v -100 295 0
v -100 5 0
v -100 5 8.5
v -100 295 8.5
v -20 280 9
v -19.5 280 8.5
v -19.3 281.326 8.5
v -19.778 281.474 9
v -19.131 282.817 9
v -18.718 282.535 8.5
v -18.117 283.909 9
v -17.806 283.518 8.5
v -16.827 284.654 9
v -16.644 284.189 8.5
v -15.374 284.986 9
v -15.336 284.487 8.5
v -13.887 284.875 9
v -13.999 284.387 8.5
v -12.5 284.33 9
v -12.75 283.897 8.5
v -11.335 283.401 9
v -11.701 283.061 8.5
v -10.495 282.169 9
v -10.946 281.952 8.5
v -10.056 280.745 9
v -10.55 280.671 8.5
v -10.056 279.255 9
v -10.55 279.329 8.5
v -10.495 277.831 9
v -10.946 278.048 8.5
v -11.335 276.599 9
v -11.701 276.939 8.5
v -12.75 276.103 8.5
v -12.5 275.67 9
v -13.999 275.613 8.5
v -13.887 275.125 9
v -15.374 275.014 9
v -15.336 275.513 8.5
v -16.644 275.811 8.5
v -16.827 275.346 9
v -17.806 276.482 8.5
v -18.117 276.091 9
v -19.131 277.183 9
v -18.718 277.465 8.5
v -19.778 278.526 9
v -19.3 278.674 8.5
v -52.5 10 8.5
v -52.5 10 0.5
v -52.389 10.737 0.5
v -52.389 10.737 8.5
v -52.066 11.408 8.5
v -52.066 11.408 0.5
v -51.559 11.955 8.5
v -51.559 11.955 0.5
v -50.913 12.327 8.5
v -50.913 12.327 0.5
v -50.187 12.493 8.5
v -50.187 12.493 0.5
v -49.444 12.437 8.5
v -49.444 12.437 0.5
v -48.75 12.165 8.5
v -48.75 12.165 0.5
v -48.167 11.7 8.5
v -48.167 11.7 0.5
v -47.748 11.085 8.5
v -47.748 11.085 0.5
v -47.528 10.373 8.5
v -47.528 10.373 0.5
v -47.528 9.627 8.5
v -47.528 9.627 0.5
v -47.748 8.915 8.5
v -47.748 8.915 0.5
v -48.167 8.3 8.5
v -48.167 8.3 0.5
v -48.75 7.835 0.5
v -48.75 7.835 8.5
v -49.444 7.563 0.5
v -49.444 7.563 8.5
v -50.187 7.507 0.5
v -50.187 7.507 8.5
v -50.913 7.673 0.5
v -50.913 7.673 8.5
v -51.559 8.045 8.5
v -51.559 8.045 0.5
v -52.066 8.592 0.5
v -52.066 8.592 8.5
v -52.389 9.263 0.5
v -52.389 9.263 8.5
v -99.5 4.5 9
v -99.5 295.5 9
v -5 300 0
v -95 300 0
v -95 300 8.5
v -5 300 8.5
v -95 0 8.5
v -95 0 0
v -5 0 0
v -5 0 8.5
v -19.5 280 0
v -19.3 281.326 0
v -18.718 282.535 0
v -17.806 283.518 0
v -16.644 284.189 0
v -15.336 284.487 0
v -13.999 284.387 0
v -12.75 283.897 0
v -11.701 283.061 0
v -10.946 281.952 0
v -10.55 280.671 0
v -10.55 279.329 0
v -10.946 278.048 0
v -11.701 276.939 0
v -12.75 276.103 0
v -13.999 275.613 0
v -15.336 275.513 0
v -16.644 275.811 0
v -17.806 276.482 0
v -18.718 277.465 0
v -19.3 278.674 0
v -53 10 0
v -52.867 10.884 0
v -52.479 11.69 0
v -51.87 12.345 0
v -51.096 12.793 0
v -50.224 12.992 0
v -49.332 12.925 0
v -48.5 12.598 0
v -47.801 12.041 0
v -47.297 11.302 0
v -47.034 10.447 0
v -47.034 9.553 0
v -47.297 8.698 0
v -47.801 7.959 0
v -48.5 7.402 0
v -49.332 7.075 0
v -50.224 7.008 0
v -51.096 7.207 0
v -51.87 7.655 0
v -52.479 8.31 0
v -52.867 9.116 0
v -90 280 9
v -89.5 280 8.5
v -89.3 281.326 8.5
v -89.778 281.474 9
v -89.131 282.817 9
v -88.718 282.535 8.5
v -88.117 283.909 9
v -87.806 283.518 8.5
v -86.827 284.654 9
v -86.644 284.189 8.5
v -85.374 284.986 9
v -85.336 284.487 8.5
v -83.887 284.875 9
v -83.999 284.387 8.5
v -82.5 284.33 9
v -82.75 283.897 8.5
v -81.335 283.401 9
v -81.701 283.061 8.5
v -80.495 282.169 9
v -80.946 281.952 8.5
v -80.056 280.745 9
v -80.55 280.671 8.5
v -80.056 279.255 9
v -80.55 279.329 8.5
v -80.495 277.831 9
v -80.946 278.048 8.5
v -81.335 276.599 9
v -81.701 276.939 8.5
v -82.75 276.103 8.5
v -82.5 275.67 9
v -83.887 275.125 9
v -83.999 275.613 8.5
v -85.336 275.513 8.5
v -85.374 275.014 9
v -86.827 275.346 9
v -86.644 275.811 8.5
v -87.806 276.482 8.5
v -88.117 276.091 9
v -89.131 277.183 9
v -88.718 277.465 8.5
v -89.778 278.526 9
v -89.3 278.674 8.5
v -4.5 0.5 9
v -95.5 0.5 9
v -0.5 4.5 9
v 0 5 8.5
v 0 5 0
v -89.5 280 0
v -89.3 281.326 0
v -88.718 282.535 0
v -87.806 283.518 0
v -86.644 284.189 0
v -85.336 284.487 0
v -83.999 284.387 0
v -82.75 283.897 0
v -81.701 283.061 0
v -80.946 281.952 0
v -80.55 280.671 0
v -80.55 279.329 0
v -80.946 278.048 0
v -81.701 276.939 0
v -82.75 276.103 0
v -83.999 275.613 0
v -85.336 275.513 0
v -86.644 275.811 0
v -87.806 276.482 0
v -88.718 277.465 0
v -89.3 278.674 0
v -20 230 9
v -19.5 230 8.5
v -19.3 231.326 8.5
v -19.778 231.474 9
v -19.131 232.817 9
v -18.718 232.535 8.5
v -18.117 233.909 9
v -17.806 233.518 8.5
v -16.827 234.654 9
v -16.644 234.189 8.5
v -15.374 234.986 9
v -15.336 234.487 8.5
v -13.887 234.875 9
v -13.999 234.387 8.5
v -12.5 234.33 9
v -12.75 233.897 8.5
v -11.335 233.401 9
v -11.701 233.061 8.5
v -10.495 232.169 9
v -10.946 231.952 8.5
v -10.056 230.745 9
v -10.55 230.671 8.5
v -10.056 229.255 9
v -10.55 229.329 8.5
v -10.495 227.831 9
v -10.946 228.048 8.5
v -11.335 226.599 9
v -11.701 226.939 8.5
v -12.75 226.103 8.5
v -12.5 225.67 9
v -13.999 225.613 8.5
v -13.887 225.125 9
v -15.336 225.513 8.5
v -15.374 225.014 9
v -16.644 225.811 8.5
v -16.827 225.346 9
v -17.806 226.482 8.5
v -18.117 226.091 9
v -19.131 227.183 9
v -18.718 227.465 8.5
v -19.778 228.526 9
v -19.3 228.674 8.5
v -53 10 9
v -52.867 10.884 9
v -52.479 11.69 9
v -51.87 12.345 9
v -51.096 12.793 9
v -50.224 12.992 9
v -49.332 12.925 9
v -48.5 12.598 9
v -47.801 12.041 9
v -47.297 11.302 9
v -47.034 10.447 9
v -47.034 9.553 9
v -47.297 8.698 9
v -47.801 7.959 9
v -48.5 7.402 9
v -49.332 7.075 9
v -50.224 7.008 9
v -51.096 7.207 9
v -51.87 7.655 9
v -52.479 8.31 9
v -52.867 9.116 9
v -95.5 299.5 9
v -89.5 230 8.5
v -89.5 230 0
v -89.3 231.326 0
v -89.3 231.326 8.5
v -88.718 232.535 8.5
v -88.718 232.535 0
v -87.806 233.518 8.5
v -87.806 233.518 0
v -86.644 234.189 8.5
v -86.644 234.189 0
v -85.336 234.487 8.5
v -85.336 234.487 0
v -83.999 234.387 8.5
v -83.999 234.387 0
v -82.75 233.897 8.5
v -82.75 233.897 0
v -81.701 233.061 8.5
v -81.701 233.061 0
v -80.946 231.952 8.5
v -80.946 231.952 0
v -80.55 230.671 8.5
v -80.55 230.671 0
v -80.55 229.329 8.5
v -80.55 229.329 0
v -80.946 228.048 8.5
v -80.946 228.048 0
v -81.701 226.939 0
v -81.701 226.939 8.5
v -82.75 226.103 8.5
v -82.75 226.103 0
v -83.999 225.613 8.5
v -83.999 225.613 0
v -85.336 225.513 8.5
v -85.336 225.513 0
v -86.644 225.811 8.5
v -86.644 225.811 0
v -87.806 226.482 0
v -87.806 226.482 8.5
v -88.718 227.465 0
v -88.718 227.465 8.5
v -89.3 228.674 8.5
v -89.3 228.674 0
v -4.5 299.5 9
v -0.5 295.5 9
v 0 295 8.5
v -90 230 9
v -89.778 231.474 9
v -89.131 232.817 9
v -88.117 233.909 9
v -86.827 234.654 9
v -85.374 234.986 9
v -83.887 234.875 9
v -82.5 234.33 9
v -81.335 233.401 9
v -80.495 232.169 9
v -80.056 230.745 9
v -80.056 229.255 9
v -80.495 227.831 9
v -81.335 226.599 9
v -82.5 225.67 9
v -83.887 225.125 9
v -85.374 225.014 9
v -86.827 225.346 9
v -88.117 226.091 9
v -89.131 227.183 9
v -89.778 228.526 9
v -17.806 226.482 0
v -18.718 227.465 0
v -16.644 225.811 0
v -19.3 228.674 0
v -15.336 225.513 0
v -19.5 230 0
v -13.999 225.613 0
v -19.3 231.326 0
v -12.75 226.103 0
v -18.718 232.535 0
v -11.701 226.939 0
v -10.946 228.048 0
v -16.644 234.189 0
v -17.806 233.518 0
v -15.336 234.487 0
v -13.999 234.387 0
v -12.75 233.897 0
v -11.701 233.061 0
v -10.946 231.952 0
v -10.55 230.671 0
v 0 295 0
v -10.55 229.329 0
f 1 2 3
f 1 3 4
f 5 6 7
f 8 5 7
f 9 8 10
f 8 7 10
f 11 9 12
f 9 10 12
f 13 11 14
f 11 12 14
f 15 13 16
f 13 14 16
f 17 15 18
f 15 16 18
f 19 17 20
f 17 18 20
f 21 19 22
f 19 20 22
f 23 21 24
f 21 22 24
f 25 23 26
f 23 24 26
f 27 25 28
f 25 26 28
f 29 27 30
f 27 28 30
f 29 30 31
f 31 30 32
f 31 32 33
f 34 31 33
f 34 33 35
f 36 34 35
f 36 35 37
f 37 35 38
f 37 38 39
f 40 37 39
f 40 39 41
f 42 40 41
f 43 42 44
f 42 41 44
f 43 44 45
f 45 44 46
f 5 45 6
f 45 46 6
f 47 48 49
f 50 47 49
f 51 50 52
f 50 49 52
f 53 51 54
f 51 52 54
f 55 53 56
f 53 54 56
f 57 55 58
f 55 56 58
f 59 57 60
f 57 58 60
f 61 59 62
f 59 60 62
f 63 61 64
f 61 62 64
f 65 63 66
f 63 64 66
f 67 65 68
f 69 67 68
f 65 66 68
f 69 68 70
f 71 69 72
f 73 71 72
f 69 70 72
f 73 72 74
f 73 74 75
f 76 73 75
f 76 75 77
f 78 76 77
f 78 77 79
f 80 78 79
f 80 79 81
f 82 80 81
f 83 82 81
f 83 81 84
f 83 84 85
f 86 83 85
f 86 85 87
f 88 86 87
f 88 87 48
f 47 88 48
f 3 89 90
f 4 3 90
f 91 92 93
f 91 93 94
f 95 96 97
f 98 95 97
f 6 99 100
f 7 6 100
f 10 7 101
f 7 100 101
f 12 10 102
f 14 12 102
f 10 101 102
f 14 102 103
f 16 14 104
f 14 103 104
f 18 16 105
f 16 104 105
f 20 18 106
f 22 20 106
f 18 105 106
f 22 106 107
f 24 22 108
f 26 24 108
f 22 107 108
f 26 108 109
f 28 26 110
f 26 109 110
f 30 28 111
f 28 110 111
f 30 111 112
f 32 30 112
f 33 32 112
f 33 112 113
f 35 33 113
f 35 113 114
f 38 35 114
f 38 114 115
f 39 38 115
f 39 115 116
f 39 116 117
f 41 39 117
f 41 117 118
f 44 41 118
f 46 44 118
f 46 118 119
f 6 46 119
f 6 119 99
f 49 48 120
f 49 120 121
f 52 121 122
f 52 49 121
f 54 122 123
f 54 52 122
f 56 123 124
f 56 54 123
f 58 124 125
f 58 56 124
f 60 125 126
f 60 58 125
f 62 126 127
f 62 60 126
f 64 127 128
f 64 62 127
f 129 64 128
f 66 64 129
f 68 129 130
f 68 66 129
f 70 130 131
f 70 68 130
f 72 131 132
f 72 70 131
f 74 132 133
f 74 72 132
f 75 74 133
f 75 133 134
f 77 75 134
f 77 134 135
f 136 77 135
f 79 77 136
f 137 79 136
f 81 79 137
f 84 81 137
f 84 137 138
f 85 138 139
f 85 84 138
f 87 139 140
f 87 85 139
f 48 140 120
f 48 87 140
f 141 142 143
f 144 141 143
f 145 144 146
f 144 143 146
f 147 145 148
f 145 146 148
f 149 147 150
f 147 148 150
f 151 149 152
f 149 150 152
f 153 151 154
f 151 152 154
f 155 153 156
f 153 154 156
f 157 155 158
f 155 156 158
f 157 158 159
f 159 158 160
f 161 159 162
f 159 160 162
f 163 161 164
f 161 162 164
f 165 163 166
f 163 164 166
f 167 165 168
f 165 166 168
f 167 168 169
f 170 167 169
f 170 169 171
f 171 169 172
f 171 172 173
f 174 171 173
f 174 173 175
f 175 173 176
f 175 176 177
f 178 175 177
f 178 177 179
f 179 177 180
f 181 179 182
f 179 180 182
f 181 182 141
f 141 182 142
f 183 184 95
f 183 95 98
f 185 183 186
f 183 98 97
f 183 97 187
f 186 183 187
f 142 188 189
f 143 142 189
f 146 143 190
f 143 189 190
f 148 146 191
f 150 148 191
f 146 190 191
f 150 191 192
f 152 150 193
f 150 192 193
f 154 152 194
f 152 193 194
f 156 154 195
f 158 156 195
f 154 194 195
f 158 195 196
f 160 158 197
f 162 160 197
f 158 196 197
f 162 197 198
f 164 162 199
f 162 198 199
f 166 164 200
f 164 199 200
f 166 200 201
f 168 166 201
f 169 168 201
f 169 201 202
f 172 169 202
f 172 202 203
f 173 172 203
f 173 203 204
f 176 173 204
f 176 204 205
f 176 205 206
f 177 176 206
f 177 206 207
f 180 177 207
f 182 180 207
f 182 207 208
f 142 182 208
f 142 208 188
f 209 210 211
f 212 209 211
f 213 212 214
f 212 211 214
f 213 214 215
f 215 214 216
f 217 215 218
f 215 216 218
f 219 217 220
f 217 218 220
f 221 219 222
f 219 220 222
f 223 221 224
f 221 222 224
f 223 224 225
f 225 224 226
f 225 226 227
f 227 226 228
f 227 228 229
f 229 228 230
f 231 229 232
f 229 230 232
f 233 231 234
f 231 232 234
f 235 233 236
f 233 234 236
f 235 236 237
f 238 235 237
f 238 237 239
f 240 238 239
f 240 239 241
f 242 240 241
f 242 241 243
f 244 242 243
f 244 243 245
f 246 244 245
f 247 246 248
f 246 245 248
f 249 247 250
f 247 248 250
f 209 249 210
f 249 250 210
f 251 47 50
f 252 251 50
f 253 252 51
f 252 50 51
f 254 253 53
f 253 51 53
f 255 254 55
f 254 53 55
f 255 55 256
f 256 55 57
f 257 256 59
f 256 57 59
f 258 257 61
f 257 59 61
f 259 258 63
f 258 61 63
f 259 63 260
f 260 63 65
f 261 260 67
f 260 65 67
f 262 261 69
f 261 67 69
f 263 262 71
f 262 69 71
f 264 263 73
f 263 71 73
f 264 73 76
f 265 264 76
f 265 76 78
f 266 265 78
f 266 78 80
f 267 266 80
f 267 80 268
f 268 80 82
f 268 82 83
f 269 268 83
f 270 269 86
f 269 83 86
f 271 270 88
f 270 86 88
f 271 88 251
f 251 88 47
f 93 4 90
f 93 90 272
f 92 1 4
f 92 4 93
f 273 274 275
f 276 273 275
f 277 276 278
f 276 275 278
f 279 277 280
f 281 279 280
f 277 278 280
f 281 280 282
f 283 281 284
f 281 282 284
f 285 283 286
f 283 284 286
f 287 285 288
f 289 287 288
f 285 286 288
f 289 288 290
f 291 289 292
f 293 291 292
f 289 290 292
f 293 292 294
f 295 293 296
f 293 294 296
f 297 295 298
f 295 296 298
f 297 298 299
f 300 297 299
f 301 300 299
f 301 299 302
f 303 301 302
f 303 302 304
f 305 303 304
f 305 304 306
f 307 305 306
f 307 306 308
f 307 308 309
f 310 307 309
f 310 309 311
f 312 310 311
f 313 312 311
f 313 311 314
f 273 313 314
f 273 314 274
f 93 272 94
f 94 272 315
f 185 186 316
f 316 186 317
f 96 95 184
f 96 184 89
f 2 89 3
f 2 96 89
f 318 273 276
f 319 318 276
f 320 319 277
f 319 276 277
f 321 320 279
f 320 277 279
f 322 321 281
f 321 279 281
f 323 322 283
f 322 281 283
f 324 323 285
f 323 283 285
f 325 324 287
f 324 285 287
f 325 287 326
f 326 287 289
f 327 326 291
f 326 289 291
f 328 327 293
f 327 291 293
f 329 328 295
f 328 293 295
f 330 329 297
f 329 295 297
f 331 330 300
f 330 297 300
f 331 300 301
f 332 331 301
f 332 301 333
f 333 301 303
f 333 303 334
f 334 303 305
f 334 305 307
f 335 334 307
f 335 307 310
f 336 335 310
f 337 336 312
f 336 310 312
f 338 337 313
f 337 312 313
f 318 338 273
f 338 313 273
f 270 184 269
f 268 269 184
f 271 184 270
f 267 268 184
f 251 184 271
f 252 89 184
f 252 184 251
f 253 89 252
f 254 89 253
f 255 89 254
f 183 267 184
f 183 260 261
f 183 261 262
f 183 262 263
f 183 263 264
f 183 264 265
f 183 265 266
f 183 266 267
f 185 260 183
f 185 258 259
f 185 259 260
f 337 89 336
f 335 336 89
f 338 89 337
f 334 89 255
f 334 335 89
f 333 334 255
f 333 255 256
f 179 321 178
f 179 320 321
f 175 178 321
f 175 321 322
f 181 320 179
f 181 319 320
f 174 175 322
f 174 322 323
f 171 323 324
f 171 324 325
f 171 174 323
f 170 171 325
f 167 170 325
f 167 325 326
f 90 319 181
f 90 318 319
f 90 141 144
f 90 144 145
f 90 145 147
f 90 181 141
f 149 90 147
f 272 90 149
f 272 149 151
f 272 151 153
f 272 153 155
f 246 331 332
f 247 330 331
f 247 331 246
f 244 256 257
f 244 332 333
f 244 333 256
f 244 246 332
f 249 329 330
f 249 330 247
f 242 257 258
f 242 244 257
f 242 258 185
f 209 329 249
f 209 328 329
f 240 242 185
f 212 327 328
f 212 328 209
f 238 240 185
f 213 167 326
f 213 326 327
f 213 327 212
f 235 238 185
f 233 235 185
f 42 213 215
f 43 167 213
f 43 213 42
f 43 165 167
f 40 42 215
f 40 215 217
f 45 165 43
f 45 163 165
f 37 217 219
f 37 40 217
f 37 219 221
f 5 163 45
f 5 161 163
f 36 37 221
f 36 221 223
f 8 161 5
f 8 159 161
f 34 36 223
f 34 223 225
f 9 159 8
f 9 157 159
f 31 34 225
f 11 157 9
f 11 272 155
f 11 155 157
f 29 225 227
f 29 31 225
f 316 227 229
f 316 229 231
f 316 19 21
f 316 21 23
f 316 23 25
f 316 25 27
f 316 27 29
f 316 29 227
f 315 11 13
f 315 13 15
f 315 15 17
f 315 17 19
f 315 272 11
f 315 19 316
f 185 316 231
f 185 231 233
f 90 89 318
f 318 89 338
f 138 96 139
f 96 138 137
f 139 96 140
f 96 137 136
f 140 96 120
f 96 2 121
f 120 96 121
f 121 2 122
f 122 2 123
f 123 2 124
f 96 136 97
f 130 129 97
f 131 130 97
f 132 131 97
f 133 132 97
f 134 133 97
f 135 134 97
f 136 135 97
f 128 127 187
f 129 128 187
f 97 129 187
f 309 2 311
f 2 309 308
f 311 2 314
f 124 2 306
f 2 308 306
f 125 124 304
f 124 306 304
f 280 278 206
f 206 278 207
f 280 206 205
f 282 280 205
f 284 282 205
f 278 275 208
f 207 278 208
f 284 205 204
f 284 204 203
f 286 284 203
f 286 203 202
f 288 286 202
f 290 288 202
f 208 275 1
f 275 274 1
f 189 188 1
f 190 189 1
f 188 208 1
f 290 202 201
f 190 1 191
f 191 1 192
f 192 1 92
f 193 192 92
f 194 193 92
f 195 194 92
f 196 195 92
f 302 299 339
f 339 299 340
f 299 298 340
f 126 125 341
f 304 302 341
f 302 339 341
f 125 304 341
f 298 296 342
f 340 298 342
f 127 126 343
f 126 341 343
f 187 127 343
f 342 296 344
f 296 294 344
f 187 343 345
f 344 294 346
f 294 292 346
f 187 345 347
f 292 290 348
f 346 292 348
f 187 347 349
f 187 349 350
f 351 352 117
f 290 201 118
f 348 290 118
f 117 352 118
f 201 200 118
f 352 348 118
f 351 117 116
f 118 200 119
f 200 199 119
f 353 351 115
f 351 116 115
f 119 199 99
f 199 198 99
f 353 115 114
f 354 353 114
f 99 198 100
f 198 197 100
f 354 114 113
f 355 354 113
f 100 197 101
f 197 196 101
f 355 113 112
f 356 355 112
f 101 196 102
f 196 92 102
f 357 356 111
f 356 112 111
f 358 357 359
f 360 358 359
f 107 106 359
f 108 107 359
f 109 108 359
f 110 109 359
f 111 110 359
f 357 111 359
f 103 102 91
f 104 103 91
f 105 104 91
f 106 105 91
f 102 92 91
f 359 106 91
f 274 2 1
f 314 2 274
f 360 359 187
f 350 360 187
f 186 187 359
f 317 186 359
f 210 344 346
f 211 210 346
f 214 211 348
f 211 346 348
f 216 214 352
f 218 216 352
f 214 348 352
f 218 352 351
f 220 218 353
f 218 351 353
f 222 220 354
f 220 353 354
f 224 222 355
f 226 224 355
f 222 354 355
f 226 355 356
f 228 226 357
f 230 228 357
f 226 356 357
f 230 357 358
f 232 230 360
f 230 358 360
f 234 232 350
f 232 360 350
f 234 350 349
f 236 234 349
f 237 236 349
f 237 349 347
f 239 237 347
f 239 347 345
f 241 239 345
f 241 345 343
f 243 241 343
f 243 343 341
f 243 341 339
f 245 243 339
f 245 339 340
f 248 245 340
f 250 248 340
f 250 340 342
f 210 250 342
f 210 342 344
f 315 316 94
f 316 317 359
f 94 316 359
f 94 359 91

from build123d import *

# Parameters (mm, degrees)
F0_W        = 100
F0_H        = 300
F1_DEPTH    = 9
F3_D        = 9
F5_D        = 5
F6_SIZE     = 0.5
F7_T1_DEPTH = 34.2168298797


# Not quite as in the source:
# - a fillet or chamfer that OpenCascade refuses, or shapes differently, is made with other operations: its cross-section is extruded or revolved along the edge and cut away or added


with BuildPart() as f1:
    # F0 (on Top) → F1 (new body)
    with BuildSketch(Plane.XY):
        with Locations((-50, 150)):
            Rectangle(F0_W, F0_H)
    extrude(amount=F1_DEPTH)

    # F3 (through all)
    with Locations(Plane.XY.offset(9)):
        with Locations((-85, 280), (-15, 280), (-15, 230), (-85, 230)):
            Hole(F3_D / 2)

    # F5 (through all)
    with Locations(Plane.XY.offset(9)):
        with Locations((-50, 10)):
            Hole(F5_D / 2)

    # F6
    f6_edges = [f1.edges().sort_by_distance(p)[0] for p in [
        (-50, 0, 9),
        (-100, 150, 9),
        (0, 150, 9),
        (-50, 300, 9),
        (-52.5, 10, 9),
        (-89.5, 230, 9),
        (-89.5, 280, 9),
        (-19.5, 230, 9),
        (-19.5, 280, 9),
        (-52.5, 10, 0),
    ]]
    chamfer(f6_edges, length=F6_SIZE)

    # F7: chamfer of 5 on 4 edges, made by hand

    # F7_s2 → F7_t1 (cut)
    with BuildSketch(Plane.XY.offset(-12.8584149398)):
        Polygon((-95, 0), (-100, 5), (-100, 0), align=None)
        Polygon((-5, 0), (0, 5), (0, 0), align=None)
        Polygon((-100, 295), (-95, 300), (-100, 300), align=None)
        Polygon((0, 295), (-5, 300), (0, 300), align=None)
    extrude(amount=F7_T1_DEPTH, mode=Mode.SUBTRACT)


solid = f1.part
